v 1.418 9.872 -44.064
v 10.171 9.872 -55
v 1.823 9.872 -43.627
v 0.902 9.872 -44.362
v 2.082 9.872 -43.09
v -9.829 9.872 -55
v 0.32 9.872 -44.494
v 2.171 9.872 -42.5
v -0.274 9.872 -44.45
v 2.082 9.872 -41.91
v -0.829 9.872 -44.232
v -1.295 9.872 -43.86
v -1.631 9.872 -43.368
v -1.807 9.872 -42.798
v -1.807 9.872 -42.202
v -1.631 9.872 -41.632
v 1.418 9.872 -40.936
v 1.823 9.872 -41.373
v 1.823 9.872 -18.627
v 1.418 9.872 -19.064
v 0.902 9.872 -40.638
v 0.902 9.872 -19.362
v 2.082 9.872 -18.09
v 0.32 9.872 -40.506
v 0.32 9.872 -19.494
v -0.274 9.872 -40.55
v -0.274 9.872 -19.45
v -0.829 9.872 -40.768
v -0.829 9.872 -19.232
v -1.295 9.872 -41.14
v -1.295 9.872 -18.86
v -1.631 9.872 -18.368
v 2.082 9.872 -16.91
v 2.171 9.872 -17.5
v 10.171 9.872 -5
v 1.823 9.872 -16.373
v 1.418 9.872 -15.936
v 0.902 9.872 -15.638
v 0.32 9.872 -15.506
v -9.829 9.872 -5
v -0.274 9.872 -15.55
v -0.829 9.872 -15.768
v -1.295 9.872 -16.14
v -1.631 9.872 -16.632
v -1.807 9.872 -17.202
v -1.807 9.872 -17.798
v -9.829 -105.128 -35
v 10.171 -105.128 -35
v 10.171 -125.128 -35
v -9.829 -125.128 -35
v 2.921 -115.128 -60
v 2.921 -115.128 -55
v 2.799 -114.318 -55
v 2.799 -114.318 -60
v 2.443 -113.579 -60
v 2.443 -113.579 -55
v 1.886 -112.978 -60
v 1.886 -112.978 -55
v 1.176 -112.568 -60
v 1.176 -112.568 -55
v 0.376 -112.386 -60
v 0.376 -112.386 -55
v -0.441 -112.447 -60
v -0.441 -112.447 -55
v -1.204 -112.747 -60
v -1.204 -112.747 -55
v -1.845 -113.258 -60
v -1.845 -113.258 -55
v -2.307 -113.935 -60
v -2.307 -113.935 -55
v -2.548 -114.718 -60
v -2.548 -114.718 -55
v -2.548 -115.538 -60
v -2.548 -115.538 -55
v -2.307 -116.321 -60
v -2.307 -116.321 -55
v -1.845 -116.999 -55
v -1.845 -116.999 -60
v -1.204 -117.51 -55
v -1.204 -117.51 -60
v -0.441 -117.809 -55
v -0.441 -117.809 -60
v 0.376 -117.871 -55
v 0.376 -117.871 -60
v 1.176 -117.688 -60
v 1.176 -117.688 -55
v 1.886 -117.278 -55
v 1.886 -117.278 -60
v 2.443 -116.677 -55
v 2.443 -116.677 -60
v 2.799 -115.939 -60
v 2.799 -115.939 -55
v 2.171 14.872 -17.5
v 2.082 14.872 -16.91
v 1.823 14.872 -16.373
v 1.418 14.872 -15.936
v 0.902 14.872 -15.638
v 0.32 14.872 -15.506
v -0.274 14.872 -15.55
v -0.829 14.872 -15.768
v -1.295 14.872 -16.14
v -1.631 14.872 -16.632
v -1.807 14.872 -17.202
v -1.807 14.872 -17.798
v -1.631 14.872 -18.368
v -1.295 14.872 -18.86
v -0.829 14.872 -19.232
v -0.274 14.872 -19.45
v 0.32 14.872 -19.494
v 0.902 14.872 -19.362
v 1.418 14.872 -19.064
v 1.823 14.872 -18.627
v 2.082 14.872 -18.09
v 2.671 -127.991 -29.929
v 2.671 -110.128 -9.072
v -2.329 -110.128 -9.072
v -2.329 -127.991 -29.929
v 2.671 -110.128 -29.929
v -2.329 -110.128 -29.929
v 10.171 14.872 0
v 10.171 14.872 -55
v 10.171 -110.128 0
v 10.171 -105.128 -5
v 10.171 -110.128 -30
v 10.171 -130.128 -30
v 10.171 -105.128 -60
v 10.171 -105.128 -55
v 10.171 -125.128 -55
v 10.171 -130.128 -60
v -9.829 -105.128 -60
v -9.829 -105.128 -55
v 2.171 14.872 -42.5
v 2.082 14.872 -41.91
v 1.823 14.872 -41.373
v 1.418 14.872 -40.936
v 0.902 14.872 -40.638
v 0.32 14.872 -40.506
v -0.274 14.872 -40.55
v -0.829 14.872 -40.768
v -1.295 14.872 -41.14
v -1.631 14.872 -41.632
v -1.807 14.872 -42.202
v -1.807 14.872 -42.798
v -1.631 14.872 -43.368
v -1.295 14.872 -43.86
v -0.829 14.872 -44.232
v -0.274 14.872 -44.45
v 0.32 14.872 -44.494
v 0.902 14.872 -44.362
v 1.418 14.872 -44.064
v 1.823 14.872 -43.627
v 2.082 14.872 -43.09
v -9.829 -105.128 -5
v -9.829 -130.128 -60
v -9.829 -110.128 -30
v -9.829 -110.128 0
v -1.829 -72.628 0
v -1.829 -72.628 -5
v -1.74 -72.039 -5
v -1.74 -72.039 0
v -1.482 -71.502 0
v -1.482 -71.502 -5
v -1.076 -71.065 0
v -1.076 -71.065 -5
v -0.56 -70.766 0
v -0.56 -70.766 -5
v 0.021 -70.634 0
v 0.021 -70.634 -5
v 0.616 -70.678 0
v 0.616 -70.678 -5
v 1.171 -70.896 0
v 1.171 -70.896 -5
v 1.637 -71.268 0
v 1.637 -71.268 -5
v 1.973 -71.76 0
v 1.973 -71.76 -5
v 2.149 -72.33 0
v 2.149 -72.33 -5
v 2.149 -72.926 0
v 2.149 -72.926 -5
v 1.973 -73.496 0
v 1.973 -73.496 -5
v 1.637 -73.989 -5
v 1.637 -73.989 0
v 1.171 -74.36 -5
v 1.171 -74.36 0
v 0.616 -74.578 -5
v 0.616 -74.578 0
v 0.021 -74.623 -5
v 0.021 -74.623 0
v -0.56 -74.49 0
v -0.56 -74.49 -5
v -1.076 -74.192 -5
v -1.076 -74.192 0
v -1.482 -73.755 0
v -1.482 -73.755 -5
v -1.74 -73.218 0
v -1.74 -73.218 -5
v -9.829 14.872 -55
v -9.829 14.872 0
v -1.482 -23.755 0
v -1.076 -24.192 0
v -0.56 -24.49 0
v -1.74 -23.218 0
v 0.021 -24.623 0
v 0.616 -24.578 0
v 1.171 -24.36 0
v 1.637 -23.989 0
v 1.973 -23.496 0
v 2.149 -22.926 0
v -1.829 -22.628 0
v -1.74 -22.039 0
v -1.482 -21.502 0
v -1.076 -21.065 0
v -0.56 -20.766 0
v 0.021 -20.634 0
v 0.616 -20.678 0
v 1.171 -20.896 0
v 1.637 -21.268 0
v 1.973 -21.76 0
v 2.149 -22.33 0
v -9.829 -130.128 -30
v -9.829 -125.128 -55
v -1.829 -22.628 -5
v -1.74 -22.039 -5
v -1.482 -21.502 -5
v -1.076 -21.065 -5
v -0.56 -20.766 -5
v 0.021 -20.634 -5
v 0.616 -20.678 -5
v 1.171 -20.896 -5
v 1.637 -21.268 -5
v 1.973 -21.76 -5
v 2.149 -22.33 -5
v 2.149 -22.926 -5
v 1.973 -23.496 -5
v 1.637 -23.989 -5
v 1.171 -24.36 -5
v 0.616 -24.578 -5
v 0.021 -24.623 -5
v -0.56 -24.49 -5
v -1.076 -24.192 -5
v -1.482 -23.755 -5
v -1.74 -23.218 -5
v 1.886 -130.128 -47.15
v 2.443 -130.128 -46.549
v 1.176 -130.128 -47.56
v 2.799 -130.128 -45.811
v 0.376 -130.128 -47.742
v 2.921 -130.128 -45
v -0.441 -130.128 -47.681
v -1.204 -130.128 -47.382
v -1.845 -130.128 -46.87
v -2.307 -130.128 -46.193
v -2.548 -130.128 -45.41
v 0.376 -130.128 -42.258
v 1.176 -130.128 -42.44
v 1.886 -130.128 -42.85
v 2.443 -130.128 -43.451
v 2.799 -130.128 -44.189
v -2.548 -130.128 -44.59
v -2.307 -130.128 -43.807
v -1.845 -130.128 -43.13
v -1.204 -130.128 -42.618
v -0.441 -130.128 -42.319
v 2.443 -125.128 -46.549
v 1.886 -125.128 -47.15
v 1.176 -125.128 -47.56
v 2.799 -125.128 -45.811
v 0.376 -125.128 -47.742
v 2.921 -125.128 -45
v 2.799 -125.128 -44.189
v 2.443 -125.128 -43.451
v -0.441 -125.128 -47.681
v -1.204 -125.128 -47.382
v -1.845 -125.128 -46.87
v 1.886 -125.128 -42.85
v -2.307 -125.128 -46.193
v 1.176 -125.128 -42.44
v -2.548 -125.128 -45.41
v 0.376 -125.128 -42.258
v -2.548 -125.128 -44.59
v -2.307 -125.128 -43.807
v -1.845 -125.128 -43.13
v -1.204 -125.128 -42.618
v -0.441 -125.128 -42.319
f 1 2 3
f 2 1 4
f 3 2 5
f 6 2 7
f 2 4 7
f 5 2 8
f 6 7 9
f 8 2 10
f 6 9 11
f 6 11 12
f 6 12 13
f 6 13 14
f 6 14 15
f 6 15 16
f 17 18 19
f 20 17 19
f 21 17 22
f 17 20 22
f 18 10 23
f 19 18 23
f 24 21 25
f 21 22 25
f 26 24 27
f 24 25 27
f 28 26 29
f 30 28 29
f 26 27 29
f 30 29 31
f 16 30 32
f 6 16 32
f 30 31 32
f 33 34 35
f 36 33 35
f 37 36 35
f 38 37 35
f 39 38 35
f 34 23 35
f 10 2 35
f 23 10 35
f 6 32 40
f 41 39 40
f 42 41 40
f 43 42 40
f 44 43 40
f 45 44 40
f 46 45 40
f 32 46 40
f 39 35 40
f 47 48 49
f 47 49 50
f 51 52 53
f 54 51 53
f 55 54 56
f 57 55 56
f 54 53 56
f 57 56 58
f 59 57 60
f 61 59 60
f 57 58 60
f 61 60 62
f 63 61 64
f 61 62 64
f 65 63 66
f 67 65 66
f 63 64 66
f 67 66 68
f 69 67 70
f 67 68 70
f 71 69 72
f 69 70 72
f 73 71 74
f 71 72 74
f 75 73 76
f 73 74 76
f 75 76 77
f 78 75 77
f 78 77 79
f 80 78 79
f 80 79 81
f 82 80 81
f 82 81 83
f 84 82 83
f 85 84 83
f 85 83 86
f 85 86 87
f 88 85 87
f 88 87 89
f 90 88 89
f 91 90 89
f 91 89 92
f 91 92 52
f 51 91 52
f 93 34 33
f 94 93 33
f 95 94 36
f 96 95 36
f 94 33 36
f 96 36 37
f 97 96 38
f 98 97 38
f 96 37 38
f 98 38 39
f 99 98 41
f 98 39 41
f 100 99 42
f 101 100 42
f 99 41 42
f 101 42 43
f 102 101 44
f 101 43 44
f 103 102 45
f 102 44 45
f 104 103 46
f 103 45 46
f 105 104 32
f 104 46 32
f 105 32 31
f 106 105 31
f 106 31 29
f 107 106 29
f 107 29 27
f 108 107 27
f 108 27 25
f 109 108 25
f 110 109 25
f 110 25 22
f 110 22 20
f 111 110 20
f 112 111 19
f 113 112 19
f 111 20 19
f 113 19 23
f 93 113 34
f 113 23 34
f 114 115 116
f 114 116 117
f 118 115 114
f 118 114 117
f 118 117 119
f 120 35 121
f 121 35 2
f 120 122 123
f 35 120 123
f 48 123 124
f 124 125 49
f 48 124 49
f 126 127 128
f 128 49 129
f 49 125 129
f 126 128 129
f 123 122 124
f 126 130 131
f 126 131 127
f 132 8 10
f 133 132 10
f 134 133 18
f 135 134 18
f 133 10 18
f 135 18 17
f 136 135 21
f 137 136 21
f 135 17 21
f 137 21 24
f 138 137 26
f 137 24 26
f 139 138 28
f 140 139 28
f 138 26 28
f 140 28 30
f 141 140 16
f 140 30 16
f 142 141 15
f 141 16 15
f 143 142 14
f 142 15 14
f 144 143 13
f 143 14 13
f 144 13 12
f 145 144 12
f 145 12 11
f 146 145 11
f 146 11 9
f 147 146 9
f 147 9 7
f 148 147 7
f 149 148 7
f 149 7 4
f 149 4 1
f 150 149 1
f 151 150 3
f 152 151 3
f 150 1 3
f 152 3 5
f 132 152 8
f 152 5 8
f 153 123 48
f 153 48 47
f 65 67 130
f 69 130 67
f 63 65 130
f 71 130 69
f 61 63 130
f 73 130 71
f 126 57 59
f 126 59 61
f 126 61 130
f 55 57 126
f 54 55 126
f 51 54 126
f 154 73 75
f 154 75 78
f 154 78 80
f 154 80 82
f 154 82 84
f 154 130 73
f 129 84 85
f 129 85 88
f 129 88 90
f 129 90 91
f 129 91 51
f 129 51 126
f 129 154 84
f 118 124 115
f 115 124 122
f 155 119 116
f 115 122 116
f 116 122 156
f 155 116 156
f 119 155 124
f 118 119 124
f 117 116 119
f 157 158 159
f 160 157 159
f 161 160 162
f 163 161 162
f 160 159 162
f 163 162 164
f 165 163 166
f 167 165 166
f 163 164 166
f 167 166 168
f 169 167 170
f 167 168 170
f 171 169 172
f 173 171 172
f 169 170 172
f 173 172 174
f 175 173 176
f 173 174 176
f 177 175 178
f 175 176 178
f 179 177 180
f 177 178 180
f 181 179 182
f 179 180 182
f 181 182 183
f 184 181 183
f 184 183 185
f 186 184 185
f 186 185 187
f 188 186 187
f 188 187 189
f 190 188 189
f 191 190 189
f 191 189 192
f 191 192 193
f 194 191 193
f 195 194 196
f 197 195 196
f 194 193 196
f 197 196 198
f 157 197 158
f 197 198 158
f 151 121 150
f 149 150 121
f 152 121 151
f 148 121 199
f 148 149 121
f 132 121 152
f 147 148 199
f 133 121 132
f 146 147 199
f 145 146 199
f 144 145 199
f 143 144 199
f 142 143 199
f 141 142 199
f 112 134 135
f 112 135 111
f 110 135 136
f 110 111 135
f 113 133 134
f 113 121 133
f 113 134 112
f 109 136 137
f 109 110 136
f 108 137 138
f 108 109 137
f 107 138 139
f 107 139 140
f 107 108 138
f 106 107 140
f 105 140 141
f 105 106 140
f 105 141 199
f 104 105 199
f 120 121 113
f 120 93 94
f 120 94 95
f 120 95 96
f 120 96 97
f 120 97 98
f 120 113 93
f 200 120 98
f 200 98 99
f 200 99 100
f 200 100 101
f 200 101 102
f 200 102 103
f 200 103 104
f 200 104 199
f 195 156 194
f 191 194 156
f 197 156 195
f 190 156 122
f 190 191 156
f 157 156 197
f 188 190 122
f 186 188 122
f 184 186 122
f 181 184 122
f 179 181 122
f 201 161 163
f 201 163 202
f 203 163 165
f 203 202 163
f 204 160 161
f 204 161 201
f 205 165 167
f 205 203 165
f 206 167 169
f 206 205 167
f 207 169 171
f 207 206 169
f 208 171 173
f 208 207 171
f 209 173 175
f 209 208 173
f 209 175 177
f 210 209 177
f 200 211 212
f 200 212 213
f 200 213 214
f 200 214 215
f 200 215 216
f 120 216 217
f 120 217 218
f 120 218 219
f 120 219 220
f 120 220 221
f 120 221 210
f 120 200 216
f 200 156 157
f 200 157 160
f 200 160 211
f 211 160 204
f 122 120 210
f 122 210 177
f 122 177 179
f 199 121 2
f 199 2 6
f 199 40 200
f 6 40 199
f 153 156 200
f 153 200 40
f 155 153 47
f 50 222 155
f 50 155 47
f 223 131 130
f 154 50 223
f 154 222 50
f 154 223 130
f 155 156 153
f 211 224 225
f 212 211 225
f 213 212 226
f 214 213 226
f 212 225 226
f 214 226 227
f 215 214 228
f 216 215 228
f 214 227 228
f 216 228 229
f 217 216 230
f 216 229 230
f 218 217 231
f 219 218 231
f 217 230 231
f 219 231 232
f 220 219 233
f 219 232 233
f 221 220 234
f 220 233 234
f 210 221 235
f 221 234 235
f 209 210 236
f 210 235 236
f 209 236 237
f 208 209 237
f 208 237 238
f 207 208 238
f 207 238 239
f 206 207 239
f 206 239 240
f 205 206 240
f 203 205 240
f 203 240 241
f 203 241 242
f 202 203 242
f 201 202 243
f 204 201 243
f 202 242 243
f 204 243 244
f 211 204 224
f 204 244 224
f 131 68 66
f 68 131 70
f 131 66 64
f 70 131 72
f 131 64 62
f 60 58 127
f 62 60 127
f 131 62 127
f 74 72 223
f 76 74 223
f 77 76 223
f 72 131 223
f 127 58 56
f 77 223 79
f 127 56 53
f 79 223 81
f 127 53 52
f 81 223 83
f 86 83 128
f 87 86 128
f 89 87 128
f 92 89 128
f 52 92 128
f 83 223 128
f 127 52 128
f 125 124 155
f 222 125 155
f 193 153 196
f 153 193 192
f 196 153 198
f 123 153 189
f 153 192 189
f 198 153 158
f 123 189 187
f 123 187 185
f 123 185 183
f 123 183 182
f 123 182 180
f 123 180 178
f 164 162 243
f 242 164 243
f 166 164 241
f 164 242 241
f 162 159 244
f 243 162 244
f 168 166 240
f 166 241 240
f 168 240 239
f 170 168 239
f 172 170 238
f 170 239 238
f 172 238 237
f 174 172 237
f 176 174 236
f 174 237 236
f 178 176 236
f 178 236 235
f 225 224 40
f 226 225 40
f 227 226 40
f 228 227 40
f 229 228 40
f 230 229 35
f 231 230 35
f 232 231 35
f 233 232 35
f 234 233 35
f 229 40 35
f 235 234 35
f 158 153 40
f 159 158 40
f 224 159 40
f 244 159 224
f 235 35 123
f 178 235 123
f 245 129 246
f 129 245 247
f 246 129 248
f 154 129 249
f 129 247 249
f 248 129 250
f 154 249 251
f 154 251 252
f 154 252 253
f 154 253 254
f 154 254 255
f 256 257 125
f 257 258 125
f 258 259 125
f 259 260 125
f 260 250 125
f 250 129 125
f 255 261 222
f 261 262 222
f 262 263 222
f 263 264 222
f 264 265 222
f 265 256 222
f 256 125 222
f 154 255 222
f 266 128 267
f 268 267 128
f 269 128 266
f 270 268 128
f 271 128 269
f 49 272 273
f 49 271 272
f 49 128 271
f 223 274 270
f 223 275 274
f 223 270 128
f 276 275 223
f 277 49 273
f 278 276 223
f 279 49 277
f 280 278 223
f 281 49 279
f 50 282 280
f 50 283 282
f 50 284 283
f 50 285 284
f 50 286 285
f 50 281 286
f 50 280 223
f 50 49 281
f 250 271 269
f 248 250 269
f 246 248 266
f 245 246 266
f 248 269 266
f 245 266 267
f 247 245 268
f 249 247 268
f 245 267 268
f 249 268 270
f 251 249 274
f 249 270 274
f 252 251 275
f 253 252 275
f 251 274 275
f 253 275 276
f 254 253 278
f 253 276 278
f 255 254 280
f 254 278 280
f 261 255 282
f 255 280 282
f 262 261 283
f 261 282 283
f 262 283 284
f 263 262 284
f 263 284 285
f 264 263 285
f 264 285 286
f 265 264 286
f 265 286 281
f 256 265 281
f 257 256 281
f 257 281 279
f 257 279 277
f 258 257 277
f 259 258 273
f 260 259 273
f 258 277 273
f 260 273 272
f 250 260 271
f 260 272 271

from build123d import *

# Parameters (mm, degrees)
SKETCH_1_W          = 20
SKETCH_1_H          = 145
EXTRUDE_1_DEPTH     = 5
SKETCH_3_W          = 20
SKETCH_3_H          = 5
EXTRUDE_2_DEPTH     = 50
SKETCH_4_W          = 20
SKETCH_4_H          = 5
EXTRUDE_3_DEPTH     = 30
SKETCH_5_W          = 20
SKETCH_5_H          = 20
CUT_EXTRUDE_1_DEPTH = 30
SKETCH_6_W          = 20
SKETCH_6_H          = 5
EXTRUDE_4_DEPTH     = 20
SKETCH_7_W          = 20
SKETCH_7_H          = 5
EXTRUDE_5_DEPTH     = 20
EXTRUDE_6_DEPTH     = 2.5
SKETCH_10_R         = 2
CUT_EXTRUDE_2_DEPTH = 5
SKETCH_11_R         = 2
CUT_EXTRUDE_3_DEPTH = 5
SKETCH_12_R         = 2.75
CUT_EXTRUDE_4_DEPTH = 5
SKETCH_13_W         = 20
SKETCH_13_H         = 5
EXTRUDE_7_DEPTH     = 5
SKETCH_14_W         = 20
SKETCH_14_H         = 5
EXTRUDE_8_DEPTH     = 20
SKETCH_15_R         = 2.75
CUT_EXTRUDE_5_DEPTH = 20


with BuildPart() as part:
    # 草图1 → 凸台-拉伸1 (new body)
    with BuildSketch(Plane.XY):
        with Locations((0.170940171, -57.628205128)):
            Rectangle(SKETCH_1_W, SKETCH_1_H)
    extrude(amount=-EXTRUDE_1_DEPTH)

    # 草图3 → 凸台-拉伸2 (add)
    with BuildSketch(Plane(origin=(0, 0, -5), x_dir=(-1, 0, 0), z_dir=(0, 0, -1))):
        with Locations((-0.170940171, 12.371794872)):
            Rectangle(SKETCH_3_W, SKETCH_3_H)
    extrude(amount=EXTRUDE_2_DEPTH)

    # 草图4 → 凸台-拉伸3 (add)
    with BuildSketch(Plane(origin=(0, 0, -5), x_dir=(-1, 0, 0), z_dir=(0, 0, -1))):
        with Locations((-0.170940171, -107.628205128)):
            Rectangle(SKETCH_4_W, SKETCH_4_H)
    extrude(amount=EXTRUDE_3_DEPTH)

    # 草图5 → 切除-拉伸1 (cut)
    with BuildSketch(Plane(origin=(0, 0, -5), x_dir=(-1, 0, 0), z_dir=(0, 0, -1))):
        with Locations((-0.170940171, -120.128205128)):
            Rectangle(SKETCH_5_W, SKETCH_5_H)
    extrude(amount=-CUT_EXTRUDE_1_DEPTH, mode=Mode.SUBTRACT)

    # 草图6 → 凸台-拉伸4 (add)
    with BuildSketch(Plane(origin=(0, -110.128205128, 0), x_dir=(-1, 0, 0), z_dir=(0, -1, 0))):
        with Locations((-0.170940171, 32.5)):
            Rectangle(SKETCH_6_W, SKETCH_6_H)
    extrude(amount=EXTRUDE_4_DEPTH)

    # 草图7 → 凸台-拉伸5 (add)
    with BuildSketch(Plane(origin=(0, 0, -35), x_dir=(-1, 0, 0), z_dir=(0, 0, -1))):
        with Locations((-0.170940171, -127.628205128)):
            Rectangle(SKETCH_7_W, SKETCH_7_H)
    extrude(amount=EXTRUDE_5_DEPTH)

    # 草图9 → 凸台-拉伸6 (add, symmetric)
    with BuildSketch(Plane(origin=(0.170940171, 0, 0), x_dir=(0, 0, -1), z_dir=(1, 0, 0))):
        Polygon((8.965273833, -110.036991646), (29.929169638, -127.991202337), (29.929169638, -110.036991646), align=None)
    extrude(amount=EXTRUDE_6_DEPTH, both=True)

    # 草图10 → 切除-拉伸2 (cut)
    with BuildSketch(Plane.XZ.offset(-9.871794872)):
        with Locations((0.170940171, -17.5)):
            Circle(SKETCH_10_R)
        with Locations((0.170940171, -42.5)):
            Circle(SKETCH_10_R)
    extrude(amount=-CUT_EXTRUDE_2_DEPTH, mode=Mode.SUBTRACT)

    # 草图11 → 切除-拉伸3 (cut)
    with BuildSketch(Plane(origin=(0, 0, -5), x_dir=(-1, 0, 0), z_dir=(0, 0, -1))):
        with Locations((-0.170940171, -22.628205128)):
            Circle(SKETCH_11_R)
        with Locations((-0.170940171, -72.628205128)):
            Circle(SKETCH_11_R)
    extrude(amount=-CUT_EXTRUDE_3_DEPTH, mode=Mode.SUBTRACT)

    # 草图12 → 切除-拉伸4 (cut)
    with BuildSketch(Plane(origin=(0, -125.128205128, 0), x_dir=(1, 0, 0), z_dir=(0, 1, 0))):
        with Locations((0.170940171, 45)):
            Circle(SKETCH_12_R)
    extrude(amount=-CUT_EXTRUDE_4_DEPTH, mode=Mode.SUBTRACT)

    # 草图13 → 凸台-拉伸7 (add)
    with BuildSketch(Plane(origin=(0, 0, -55), x_dir=(-1, 0, 0), z_dir=(0, 0, -1))):
        with Locations((-0.170940171, -127.628205128)):
            Rectangle(SKETCH_13_W, SKETCH_13_H)
    extrude(amount=EXTRUDE_7_DEPTH)

    # 草图14 → 凸台-拉伸8 (add)
    with BuildSketch(Plane(origin=(0, -125.128205128, 0), x_dir=(1, 0, 0), z_dir=(0, 1, 0))):
        with Locations((0.170940171, 57.5)):
            Rectangle(SKETCH_14_W, SKETCH_14_H)
    extrude(amount=EXTRUDE_8_DEPTH)

    # 草图15 → 切除-拉伸5 (cut)
    with BuildSketch(Plane.XY.offset(-55)):
        with Locations((0.170940171, -115.12820513)):
            Circle(SKETCH_15_R)
    extrude(amount=-CUT_EXTRUDE_5_DEPTH, mode=Mode.SUBTRACT)


solid = part.part
